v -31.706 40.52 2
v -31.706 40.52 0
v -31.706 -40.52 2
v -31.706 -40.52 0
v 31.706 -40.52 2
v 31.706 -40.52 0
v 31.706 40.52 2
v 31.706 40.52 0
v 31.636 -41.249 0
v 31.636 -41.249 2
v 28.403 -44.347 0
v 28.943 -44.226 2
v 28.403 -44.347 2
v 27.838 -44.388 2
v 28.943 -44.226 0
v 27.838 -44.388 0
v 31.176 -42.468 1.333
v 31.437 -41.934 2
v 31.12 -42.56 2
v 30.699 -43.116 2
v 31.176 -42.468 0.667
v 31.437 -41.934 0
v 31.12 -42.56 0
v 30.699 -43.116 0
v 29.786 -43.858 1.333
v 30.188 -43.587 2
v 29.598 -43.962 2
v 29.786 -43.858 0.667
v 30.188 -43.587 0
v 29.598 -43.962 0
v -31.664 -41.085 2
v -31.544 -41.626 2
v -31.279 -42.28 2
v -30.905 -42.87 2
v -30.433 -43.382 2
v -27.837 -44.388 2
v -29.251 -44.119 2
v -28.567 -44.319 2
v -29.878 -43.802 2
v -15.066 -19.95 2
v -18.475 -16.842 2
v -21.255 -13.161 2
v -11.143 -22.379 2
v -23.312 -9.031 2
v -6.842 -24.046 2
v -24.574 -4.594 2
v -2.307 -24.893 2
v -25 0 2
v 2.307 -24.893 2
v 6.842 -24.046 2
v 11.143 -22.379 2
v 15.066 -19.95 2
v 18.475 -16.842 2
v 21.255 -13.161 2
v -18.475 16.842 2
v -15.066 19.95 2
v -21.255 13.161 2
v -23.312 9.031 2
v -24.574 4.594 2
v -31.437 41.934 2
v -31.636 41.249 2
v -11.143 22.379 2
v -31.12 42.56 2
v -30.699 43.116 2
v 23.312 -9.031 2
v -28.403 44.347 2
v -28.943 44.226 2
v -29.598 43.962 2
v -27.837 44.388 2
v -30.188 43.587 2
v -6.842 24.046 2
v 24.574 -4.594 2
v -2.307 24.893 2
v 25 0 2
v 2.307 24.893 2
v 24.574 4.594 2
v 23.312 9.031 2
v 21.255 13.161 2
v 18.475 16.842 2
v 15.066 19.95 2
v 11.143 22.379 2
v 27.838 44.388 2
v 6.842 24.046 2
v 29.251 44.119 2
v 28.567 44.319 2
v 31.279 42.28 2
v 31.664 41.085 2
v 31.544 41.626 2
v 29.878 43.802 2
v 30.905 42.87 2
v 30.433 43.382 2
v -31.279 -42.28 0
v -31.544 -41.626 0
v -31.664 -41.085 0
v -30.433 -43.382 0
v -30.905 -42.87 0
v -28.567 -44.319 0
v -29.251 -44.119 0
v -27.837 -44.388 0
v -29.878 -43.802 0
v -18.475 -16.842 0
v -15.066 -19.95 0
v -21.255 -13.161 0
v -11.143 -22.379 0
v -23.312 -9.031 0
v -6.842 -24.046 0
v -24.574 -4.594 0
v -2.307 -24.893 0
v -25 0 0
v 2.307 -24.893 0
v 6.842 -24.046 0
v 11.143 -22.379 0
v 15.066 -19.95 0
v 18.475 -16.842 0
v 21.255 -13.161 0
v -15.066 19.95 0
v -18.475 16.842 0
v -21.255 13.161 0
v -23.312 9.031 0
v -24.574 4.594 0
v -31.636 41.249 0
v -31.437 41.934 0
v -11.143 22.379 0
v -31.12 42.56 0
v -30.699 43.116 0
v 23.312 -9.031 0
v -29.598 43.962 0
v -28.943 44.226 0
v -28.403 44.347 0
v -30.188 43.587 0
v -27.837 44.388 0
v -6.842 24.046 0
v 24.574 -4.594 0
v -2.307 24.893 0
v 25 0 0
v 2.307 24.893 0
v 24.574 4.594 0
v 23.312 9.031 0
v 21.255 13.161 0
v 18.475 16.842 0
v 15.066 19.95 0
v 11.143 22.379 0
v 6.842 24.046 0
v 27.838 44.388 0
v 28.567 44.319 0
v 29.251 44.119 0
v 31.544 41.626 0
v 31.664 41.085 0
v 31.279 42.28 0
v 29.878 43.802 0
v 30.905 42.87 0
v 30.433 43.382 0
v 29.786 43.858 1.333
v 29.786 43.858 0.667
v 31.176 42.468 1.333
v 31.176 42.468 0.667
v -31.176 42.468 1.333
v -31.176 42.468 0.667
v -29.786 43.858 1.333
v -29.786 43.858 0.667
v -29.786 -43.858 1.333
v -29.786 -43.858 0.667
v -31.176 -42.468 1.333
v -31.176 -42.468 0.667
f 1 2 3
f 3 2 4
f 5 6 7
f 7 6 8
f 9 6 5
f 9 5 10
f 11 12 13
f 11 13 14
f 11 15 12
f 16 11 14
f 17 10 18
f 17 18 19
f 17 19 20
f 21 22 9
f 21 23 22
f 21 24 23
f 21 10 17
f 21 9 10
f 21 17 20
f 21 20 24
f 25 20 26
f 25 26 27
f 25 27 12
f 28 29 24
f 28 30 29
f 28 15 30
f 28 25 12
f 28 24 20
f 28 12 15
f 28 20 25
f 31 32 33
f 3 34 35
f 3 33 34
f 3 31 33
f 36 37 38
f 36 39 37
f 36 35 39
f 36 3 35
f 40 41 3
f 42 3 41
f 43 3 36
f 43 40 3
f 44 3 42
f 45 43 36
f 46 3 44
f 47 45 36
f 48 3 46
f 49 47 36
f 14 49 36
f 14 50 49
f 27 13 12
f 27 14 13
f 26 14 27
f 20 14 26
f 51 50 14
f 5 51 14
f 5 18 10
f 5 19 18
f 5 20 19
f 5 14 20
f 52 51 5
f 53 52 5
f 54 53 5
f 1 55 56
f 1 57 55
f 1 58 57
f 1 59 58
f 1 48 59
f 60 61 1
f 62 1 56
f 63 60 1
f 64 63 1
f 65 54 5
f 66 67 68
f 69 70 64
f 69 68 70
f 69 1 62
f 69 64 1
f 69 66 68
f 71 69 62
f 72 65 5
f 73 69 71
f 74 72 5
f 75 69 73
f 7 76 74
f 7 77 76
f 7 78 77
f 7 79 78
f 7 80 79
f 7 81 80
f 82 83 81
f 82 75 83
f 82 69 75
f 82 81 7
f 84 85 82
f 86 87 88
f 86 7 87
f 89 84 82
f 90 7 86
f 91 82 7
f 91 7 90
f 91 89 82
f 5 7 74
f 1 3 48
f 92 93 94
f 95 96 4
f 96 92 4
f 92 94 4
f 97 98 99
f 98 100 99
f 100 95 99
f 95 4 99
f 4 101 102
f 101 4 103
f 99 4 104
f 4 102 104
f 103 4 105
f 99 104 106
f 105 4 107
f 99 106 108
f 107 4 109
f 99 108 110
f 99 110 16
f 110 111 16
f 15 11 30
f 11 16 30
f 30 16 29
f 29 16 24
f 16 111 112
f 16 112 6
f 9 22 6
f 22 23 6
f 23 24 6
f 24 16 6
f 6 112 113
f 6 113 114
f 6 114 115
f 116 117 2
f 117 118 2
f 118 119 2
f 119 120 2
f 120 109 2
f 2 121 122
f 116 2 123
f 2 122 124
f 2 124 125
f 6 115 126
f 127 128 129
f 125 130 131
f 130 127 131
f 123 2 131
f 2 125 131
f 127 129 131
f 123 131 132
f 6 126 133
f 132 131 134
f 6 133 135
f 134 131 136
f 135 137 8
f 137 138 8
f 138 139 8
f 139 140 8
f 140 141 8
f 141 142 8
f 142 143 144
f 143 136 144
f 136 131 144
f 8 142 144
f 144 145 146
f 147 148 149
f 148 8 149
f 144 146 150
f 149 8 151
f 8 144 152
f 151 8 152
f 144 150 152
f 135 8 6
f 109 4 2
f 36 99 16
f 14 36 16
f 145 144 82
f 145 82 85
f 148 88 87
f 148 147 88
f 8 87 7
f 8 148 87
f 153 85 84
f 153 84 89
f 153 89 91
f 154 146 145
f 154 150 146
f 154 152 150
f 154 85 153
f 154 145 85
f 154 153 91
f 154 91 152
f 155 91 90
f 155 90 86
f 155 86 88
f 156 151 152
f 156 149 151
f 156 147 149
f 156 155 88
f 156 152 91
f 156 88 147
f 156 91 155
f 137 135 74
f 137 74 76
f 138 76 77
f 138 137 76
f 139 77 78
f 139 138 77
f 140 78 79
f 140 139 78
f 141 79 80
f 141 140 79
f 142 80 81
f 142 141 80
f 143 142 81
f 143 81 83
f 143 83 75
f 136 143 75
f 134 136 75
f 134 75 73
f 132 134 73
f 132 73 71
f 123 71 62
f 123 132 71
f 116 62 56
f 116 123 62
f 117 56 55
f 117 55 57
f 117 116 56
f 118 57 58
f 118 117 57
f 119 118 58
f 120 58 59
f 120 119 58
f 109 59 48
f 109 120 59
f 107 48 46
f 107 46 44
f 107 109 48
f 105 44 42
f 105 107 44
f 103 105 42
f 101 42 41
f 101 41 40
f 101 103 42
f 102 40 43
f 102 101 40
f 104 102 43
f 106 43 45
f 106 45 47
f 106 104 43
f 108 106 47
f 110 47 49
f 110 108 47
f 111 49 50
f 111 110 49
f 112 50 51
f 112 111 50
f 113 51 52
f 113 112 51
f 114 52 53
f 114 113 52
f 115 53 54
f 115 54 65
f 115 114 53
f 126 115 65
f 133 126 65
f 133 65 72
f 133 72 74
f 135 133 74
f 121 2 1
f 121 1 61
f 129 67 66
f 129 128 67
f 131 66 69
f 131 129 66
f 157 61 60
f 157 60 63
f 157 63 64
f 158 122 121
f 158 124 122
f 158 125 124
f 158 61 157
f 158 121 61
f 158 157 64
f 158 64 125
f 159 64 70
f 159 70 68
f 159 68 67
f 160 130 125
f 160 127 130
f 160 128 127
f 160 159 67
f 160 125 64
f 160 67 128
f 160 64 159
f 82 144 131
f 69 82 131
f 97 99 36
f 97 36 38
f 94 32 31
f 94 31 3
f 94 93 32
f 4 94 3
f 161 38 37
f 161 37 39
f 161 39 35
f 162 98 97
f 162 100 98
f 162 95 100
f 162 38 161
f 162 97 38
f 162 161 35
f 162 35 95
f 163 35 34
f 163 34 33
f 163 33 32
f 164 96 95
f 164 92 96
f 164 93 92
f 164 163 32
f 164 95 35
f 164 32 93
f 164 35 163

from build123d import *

# Parameters (mm, degrees)
F0_R     = 25
F1_DEPTH = 2


with BuildPart() as f1:
    # F0 (on Top) → F1 (new body)
    with BuildSketch(Plane.XY):
        with BuildLine():
            Line((31.70578804, -40.5199971151), (31.70578804, 40.5199971151))
            add(Edge.make_bspline(
                [(27.8376818991, 44.388103256), (29.9651402766, 44.388103256), (31.70578804, 42.6474554926), (31.70578804, 40.5199971151)],
                knots=[0, 0, 0, 0, 1, 1, 1, 1], degree=3))
            Line((27.8376818991, 44.388103256), (-27.8373296126, 44.388103256))
            add(Edge.make_bspline(
                [(-31.70578804, 40.5199971151), (-31.70578804, 42.6474554926), (-29.9651402766, 44.388103256), (-27.8373296126, 44.388103256)],
                knots=[0, 0, 0, 0, 1, 1, 1, 1], degree=3))
            Line((-31.70578804, 40.5199971151), (-31.70578804, -40.5199971151))
            add(Edge.make_bspline(
                [(-27.8373296126, -44.388103256), (-29.9651402766, -44.388103256), (-31.70578804, -42.6474554926), (-31.70578804, -40.5199971151)],
                knots=[0, 0, 0, 0, 1, 1, 1, 1], degree=3))
            Line((-27.8373296126, -44.388103256), (27.8376818991, -44.388103256))
            add(Edge.make_bspline(
                [(31.70578804, -40.5199971151), (31.70578804, -42.6474554926), (29.9651402766, -44.388103256), (27.8376818991, -44.388103256)],
                knots=[0, 0, 0, 0, 1, 1, 1, 1], degree=3))
        make_face()
        Circle(F0_R, mode=Mode.SUBTRACT)
    extrude(amount=F1_DEPTH)


solid = f1.part
